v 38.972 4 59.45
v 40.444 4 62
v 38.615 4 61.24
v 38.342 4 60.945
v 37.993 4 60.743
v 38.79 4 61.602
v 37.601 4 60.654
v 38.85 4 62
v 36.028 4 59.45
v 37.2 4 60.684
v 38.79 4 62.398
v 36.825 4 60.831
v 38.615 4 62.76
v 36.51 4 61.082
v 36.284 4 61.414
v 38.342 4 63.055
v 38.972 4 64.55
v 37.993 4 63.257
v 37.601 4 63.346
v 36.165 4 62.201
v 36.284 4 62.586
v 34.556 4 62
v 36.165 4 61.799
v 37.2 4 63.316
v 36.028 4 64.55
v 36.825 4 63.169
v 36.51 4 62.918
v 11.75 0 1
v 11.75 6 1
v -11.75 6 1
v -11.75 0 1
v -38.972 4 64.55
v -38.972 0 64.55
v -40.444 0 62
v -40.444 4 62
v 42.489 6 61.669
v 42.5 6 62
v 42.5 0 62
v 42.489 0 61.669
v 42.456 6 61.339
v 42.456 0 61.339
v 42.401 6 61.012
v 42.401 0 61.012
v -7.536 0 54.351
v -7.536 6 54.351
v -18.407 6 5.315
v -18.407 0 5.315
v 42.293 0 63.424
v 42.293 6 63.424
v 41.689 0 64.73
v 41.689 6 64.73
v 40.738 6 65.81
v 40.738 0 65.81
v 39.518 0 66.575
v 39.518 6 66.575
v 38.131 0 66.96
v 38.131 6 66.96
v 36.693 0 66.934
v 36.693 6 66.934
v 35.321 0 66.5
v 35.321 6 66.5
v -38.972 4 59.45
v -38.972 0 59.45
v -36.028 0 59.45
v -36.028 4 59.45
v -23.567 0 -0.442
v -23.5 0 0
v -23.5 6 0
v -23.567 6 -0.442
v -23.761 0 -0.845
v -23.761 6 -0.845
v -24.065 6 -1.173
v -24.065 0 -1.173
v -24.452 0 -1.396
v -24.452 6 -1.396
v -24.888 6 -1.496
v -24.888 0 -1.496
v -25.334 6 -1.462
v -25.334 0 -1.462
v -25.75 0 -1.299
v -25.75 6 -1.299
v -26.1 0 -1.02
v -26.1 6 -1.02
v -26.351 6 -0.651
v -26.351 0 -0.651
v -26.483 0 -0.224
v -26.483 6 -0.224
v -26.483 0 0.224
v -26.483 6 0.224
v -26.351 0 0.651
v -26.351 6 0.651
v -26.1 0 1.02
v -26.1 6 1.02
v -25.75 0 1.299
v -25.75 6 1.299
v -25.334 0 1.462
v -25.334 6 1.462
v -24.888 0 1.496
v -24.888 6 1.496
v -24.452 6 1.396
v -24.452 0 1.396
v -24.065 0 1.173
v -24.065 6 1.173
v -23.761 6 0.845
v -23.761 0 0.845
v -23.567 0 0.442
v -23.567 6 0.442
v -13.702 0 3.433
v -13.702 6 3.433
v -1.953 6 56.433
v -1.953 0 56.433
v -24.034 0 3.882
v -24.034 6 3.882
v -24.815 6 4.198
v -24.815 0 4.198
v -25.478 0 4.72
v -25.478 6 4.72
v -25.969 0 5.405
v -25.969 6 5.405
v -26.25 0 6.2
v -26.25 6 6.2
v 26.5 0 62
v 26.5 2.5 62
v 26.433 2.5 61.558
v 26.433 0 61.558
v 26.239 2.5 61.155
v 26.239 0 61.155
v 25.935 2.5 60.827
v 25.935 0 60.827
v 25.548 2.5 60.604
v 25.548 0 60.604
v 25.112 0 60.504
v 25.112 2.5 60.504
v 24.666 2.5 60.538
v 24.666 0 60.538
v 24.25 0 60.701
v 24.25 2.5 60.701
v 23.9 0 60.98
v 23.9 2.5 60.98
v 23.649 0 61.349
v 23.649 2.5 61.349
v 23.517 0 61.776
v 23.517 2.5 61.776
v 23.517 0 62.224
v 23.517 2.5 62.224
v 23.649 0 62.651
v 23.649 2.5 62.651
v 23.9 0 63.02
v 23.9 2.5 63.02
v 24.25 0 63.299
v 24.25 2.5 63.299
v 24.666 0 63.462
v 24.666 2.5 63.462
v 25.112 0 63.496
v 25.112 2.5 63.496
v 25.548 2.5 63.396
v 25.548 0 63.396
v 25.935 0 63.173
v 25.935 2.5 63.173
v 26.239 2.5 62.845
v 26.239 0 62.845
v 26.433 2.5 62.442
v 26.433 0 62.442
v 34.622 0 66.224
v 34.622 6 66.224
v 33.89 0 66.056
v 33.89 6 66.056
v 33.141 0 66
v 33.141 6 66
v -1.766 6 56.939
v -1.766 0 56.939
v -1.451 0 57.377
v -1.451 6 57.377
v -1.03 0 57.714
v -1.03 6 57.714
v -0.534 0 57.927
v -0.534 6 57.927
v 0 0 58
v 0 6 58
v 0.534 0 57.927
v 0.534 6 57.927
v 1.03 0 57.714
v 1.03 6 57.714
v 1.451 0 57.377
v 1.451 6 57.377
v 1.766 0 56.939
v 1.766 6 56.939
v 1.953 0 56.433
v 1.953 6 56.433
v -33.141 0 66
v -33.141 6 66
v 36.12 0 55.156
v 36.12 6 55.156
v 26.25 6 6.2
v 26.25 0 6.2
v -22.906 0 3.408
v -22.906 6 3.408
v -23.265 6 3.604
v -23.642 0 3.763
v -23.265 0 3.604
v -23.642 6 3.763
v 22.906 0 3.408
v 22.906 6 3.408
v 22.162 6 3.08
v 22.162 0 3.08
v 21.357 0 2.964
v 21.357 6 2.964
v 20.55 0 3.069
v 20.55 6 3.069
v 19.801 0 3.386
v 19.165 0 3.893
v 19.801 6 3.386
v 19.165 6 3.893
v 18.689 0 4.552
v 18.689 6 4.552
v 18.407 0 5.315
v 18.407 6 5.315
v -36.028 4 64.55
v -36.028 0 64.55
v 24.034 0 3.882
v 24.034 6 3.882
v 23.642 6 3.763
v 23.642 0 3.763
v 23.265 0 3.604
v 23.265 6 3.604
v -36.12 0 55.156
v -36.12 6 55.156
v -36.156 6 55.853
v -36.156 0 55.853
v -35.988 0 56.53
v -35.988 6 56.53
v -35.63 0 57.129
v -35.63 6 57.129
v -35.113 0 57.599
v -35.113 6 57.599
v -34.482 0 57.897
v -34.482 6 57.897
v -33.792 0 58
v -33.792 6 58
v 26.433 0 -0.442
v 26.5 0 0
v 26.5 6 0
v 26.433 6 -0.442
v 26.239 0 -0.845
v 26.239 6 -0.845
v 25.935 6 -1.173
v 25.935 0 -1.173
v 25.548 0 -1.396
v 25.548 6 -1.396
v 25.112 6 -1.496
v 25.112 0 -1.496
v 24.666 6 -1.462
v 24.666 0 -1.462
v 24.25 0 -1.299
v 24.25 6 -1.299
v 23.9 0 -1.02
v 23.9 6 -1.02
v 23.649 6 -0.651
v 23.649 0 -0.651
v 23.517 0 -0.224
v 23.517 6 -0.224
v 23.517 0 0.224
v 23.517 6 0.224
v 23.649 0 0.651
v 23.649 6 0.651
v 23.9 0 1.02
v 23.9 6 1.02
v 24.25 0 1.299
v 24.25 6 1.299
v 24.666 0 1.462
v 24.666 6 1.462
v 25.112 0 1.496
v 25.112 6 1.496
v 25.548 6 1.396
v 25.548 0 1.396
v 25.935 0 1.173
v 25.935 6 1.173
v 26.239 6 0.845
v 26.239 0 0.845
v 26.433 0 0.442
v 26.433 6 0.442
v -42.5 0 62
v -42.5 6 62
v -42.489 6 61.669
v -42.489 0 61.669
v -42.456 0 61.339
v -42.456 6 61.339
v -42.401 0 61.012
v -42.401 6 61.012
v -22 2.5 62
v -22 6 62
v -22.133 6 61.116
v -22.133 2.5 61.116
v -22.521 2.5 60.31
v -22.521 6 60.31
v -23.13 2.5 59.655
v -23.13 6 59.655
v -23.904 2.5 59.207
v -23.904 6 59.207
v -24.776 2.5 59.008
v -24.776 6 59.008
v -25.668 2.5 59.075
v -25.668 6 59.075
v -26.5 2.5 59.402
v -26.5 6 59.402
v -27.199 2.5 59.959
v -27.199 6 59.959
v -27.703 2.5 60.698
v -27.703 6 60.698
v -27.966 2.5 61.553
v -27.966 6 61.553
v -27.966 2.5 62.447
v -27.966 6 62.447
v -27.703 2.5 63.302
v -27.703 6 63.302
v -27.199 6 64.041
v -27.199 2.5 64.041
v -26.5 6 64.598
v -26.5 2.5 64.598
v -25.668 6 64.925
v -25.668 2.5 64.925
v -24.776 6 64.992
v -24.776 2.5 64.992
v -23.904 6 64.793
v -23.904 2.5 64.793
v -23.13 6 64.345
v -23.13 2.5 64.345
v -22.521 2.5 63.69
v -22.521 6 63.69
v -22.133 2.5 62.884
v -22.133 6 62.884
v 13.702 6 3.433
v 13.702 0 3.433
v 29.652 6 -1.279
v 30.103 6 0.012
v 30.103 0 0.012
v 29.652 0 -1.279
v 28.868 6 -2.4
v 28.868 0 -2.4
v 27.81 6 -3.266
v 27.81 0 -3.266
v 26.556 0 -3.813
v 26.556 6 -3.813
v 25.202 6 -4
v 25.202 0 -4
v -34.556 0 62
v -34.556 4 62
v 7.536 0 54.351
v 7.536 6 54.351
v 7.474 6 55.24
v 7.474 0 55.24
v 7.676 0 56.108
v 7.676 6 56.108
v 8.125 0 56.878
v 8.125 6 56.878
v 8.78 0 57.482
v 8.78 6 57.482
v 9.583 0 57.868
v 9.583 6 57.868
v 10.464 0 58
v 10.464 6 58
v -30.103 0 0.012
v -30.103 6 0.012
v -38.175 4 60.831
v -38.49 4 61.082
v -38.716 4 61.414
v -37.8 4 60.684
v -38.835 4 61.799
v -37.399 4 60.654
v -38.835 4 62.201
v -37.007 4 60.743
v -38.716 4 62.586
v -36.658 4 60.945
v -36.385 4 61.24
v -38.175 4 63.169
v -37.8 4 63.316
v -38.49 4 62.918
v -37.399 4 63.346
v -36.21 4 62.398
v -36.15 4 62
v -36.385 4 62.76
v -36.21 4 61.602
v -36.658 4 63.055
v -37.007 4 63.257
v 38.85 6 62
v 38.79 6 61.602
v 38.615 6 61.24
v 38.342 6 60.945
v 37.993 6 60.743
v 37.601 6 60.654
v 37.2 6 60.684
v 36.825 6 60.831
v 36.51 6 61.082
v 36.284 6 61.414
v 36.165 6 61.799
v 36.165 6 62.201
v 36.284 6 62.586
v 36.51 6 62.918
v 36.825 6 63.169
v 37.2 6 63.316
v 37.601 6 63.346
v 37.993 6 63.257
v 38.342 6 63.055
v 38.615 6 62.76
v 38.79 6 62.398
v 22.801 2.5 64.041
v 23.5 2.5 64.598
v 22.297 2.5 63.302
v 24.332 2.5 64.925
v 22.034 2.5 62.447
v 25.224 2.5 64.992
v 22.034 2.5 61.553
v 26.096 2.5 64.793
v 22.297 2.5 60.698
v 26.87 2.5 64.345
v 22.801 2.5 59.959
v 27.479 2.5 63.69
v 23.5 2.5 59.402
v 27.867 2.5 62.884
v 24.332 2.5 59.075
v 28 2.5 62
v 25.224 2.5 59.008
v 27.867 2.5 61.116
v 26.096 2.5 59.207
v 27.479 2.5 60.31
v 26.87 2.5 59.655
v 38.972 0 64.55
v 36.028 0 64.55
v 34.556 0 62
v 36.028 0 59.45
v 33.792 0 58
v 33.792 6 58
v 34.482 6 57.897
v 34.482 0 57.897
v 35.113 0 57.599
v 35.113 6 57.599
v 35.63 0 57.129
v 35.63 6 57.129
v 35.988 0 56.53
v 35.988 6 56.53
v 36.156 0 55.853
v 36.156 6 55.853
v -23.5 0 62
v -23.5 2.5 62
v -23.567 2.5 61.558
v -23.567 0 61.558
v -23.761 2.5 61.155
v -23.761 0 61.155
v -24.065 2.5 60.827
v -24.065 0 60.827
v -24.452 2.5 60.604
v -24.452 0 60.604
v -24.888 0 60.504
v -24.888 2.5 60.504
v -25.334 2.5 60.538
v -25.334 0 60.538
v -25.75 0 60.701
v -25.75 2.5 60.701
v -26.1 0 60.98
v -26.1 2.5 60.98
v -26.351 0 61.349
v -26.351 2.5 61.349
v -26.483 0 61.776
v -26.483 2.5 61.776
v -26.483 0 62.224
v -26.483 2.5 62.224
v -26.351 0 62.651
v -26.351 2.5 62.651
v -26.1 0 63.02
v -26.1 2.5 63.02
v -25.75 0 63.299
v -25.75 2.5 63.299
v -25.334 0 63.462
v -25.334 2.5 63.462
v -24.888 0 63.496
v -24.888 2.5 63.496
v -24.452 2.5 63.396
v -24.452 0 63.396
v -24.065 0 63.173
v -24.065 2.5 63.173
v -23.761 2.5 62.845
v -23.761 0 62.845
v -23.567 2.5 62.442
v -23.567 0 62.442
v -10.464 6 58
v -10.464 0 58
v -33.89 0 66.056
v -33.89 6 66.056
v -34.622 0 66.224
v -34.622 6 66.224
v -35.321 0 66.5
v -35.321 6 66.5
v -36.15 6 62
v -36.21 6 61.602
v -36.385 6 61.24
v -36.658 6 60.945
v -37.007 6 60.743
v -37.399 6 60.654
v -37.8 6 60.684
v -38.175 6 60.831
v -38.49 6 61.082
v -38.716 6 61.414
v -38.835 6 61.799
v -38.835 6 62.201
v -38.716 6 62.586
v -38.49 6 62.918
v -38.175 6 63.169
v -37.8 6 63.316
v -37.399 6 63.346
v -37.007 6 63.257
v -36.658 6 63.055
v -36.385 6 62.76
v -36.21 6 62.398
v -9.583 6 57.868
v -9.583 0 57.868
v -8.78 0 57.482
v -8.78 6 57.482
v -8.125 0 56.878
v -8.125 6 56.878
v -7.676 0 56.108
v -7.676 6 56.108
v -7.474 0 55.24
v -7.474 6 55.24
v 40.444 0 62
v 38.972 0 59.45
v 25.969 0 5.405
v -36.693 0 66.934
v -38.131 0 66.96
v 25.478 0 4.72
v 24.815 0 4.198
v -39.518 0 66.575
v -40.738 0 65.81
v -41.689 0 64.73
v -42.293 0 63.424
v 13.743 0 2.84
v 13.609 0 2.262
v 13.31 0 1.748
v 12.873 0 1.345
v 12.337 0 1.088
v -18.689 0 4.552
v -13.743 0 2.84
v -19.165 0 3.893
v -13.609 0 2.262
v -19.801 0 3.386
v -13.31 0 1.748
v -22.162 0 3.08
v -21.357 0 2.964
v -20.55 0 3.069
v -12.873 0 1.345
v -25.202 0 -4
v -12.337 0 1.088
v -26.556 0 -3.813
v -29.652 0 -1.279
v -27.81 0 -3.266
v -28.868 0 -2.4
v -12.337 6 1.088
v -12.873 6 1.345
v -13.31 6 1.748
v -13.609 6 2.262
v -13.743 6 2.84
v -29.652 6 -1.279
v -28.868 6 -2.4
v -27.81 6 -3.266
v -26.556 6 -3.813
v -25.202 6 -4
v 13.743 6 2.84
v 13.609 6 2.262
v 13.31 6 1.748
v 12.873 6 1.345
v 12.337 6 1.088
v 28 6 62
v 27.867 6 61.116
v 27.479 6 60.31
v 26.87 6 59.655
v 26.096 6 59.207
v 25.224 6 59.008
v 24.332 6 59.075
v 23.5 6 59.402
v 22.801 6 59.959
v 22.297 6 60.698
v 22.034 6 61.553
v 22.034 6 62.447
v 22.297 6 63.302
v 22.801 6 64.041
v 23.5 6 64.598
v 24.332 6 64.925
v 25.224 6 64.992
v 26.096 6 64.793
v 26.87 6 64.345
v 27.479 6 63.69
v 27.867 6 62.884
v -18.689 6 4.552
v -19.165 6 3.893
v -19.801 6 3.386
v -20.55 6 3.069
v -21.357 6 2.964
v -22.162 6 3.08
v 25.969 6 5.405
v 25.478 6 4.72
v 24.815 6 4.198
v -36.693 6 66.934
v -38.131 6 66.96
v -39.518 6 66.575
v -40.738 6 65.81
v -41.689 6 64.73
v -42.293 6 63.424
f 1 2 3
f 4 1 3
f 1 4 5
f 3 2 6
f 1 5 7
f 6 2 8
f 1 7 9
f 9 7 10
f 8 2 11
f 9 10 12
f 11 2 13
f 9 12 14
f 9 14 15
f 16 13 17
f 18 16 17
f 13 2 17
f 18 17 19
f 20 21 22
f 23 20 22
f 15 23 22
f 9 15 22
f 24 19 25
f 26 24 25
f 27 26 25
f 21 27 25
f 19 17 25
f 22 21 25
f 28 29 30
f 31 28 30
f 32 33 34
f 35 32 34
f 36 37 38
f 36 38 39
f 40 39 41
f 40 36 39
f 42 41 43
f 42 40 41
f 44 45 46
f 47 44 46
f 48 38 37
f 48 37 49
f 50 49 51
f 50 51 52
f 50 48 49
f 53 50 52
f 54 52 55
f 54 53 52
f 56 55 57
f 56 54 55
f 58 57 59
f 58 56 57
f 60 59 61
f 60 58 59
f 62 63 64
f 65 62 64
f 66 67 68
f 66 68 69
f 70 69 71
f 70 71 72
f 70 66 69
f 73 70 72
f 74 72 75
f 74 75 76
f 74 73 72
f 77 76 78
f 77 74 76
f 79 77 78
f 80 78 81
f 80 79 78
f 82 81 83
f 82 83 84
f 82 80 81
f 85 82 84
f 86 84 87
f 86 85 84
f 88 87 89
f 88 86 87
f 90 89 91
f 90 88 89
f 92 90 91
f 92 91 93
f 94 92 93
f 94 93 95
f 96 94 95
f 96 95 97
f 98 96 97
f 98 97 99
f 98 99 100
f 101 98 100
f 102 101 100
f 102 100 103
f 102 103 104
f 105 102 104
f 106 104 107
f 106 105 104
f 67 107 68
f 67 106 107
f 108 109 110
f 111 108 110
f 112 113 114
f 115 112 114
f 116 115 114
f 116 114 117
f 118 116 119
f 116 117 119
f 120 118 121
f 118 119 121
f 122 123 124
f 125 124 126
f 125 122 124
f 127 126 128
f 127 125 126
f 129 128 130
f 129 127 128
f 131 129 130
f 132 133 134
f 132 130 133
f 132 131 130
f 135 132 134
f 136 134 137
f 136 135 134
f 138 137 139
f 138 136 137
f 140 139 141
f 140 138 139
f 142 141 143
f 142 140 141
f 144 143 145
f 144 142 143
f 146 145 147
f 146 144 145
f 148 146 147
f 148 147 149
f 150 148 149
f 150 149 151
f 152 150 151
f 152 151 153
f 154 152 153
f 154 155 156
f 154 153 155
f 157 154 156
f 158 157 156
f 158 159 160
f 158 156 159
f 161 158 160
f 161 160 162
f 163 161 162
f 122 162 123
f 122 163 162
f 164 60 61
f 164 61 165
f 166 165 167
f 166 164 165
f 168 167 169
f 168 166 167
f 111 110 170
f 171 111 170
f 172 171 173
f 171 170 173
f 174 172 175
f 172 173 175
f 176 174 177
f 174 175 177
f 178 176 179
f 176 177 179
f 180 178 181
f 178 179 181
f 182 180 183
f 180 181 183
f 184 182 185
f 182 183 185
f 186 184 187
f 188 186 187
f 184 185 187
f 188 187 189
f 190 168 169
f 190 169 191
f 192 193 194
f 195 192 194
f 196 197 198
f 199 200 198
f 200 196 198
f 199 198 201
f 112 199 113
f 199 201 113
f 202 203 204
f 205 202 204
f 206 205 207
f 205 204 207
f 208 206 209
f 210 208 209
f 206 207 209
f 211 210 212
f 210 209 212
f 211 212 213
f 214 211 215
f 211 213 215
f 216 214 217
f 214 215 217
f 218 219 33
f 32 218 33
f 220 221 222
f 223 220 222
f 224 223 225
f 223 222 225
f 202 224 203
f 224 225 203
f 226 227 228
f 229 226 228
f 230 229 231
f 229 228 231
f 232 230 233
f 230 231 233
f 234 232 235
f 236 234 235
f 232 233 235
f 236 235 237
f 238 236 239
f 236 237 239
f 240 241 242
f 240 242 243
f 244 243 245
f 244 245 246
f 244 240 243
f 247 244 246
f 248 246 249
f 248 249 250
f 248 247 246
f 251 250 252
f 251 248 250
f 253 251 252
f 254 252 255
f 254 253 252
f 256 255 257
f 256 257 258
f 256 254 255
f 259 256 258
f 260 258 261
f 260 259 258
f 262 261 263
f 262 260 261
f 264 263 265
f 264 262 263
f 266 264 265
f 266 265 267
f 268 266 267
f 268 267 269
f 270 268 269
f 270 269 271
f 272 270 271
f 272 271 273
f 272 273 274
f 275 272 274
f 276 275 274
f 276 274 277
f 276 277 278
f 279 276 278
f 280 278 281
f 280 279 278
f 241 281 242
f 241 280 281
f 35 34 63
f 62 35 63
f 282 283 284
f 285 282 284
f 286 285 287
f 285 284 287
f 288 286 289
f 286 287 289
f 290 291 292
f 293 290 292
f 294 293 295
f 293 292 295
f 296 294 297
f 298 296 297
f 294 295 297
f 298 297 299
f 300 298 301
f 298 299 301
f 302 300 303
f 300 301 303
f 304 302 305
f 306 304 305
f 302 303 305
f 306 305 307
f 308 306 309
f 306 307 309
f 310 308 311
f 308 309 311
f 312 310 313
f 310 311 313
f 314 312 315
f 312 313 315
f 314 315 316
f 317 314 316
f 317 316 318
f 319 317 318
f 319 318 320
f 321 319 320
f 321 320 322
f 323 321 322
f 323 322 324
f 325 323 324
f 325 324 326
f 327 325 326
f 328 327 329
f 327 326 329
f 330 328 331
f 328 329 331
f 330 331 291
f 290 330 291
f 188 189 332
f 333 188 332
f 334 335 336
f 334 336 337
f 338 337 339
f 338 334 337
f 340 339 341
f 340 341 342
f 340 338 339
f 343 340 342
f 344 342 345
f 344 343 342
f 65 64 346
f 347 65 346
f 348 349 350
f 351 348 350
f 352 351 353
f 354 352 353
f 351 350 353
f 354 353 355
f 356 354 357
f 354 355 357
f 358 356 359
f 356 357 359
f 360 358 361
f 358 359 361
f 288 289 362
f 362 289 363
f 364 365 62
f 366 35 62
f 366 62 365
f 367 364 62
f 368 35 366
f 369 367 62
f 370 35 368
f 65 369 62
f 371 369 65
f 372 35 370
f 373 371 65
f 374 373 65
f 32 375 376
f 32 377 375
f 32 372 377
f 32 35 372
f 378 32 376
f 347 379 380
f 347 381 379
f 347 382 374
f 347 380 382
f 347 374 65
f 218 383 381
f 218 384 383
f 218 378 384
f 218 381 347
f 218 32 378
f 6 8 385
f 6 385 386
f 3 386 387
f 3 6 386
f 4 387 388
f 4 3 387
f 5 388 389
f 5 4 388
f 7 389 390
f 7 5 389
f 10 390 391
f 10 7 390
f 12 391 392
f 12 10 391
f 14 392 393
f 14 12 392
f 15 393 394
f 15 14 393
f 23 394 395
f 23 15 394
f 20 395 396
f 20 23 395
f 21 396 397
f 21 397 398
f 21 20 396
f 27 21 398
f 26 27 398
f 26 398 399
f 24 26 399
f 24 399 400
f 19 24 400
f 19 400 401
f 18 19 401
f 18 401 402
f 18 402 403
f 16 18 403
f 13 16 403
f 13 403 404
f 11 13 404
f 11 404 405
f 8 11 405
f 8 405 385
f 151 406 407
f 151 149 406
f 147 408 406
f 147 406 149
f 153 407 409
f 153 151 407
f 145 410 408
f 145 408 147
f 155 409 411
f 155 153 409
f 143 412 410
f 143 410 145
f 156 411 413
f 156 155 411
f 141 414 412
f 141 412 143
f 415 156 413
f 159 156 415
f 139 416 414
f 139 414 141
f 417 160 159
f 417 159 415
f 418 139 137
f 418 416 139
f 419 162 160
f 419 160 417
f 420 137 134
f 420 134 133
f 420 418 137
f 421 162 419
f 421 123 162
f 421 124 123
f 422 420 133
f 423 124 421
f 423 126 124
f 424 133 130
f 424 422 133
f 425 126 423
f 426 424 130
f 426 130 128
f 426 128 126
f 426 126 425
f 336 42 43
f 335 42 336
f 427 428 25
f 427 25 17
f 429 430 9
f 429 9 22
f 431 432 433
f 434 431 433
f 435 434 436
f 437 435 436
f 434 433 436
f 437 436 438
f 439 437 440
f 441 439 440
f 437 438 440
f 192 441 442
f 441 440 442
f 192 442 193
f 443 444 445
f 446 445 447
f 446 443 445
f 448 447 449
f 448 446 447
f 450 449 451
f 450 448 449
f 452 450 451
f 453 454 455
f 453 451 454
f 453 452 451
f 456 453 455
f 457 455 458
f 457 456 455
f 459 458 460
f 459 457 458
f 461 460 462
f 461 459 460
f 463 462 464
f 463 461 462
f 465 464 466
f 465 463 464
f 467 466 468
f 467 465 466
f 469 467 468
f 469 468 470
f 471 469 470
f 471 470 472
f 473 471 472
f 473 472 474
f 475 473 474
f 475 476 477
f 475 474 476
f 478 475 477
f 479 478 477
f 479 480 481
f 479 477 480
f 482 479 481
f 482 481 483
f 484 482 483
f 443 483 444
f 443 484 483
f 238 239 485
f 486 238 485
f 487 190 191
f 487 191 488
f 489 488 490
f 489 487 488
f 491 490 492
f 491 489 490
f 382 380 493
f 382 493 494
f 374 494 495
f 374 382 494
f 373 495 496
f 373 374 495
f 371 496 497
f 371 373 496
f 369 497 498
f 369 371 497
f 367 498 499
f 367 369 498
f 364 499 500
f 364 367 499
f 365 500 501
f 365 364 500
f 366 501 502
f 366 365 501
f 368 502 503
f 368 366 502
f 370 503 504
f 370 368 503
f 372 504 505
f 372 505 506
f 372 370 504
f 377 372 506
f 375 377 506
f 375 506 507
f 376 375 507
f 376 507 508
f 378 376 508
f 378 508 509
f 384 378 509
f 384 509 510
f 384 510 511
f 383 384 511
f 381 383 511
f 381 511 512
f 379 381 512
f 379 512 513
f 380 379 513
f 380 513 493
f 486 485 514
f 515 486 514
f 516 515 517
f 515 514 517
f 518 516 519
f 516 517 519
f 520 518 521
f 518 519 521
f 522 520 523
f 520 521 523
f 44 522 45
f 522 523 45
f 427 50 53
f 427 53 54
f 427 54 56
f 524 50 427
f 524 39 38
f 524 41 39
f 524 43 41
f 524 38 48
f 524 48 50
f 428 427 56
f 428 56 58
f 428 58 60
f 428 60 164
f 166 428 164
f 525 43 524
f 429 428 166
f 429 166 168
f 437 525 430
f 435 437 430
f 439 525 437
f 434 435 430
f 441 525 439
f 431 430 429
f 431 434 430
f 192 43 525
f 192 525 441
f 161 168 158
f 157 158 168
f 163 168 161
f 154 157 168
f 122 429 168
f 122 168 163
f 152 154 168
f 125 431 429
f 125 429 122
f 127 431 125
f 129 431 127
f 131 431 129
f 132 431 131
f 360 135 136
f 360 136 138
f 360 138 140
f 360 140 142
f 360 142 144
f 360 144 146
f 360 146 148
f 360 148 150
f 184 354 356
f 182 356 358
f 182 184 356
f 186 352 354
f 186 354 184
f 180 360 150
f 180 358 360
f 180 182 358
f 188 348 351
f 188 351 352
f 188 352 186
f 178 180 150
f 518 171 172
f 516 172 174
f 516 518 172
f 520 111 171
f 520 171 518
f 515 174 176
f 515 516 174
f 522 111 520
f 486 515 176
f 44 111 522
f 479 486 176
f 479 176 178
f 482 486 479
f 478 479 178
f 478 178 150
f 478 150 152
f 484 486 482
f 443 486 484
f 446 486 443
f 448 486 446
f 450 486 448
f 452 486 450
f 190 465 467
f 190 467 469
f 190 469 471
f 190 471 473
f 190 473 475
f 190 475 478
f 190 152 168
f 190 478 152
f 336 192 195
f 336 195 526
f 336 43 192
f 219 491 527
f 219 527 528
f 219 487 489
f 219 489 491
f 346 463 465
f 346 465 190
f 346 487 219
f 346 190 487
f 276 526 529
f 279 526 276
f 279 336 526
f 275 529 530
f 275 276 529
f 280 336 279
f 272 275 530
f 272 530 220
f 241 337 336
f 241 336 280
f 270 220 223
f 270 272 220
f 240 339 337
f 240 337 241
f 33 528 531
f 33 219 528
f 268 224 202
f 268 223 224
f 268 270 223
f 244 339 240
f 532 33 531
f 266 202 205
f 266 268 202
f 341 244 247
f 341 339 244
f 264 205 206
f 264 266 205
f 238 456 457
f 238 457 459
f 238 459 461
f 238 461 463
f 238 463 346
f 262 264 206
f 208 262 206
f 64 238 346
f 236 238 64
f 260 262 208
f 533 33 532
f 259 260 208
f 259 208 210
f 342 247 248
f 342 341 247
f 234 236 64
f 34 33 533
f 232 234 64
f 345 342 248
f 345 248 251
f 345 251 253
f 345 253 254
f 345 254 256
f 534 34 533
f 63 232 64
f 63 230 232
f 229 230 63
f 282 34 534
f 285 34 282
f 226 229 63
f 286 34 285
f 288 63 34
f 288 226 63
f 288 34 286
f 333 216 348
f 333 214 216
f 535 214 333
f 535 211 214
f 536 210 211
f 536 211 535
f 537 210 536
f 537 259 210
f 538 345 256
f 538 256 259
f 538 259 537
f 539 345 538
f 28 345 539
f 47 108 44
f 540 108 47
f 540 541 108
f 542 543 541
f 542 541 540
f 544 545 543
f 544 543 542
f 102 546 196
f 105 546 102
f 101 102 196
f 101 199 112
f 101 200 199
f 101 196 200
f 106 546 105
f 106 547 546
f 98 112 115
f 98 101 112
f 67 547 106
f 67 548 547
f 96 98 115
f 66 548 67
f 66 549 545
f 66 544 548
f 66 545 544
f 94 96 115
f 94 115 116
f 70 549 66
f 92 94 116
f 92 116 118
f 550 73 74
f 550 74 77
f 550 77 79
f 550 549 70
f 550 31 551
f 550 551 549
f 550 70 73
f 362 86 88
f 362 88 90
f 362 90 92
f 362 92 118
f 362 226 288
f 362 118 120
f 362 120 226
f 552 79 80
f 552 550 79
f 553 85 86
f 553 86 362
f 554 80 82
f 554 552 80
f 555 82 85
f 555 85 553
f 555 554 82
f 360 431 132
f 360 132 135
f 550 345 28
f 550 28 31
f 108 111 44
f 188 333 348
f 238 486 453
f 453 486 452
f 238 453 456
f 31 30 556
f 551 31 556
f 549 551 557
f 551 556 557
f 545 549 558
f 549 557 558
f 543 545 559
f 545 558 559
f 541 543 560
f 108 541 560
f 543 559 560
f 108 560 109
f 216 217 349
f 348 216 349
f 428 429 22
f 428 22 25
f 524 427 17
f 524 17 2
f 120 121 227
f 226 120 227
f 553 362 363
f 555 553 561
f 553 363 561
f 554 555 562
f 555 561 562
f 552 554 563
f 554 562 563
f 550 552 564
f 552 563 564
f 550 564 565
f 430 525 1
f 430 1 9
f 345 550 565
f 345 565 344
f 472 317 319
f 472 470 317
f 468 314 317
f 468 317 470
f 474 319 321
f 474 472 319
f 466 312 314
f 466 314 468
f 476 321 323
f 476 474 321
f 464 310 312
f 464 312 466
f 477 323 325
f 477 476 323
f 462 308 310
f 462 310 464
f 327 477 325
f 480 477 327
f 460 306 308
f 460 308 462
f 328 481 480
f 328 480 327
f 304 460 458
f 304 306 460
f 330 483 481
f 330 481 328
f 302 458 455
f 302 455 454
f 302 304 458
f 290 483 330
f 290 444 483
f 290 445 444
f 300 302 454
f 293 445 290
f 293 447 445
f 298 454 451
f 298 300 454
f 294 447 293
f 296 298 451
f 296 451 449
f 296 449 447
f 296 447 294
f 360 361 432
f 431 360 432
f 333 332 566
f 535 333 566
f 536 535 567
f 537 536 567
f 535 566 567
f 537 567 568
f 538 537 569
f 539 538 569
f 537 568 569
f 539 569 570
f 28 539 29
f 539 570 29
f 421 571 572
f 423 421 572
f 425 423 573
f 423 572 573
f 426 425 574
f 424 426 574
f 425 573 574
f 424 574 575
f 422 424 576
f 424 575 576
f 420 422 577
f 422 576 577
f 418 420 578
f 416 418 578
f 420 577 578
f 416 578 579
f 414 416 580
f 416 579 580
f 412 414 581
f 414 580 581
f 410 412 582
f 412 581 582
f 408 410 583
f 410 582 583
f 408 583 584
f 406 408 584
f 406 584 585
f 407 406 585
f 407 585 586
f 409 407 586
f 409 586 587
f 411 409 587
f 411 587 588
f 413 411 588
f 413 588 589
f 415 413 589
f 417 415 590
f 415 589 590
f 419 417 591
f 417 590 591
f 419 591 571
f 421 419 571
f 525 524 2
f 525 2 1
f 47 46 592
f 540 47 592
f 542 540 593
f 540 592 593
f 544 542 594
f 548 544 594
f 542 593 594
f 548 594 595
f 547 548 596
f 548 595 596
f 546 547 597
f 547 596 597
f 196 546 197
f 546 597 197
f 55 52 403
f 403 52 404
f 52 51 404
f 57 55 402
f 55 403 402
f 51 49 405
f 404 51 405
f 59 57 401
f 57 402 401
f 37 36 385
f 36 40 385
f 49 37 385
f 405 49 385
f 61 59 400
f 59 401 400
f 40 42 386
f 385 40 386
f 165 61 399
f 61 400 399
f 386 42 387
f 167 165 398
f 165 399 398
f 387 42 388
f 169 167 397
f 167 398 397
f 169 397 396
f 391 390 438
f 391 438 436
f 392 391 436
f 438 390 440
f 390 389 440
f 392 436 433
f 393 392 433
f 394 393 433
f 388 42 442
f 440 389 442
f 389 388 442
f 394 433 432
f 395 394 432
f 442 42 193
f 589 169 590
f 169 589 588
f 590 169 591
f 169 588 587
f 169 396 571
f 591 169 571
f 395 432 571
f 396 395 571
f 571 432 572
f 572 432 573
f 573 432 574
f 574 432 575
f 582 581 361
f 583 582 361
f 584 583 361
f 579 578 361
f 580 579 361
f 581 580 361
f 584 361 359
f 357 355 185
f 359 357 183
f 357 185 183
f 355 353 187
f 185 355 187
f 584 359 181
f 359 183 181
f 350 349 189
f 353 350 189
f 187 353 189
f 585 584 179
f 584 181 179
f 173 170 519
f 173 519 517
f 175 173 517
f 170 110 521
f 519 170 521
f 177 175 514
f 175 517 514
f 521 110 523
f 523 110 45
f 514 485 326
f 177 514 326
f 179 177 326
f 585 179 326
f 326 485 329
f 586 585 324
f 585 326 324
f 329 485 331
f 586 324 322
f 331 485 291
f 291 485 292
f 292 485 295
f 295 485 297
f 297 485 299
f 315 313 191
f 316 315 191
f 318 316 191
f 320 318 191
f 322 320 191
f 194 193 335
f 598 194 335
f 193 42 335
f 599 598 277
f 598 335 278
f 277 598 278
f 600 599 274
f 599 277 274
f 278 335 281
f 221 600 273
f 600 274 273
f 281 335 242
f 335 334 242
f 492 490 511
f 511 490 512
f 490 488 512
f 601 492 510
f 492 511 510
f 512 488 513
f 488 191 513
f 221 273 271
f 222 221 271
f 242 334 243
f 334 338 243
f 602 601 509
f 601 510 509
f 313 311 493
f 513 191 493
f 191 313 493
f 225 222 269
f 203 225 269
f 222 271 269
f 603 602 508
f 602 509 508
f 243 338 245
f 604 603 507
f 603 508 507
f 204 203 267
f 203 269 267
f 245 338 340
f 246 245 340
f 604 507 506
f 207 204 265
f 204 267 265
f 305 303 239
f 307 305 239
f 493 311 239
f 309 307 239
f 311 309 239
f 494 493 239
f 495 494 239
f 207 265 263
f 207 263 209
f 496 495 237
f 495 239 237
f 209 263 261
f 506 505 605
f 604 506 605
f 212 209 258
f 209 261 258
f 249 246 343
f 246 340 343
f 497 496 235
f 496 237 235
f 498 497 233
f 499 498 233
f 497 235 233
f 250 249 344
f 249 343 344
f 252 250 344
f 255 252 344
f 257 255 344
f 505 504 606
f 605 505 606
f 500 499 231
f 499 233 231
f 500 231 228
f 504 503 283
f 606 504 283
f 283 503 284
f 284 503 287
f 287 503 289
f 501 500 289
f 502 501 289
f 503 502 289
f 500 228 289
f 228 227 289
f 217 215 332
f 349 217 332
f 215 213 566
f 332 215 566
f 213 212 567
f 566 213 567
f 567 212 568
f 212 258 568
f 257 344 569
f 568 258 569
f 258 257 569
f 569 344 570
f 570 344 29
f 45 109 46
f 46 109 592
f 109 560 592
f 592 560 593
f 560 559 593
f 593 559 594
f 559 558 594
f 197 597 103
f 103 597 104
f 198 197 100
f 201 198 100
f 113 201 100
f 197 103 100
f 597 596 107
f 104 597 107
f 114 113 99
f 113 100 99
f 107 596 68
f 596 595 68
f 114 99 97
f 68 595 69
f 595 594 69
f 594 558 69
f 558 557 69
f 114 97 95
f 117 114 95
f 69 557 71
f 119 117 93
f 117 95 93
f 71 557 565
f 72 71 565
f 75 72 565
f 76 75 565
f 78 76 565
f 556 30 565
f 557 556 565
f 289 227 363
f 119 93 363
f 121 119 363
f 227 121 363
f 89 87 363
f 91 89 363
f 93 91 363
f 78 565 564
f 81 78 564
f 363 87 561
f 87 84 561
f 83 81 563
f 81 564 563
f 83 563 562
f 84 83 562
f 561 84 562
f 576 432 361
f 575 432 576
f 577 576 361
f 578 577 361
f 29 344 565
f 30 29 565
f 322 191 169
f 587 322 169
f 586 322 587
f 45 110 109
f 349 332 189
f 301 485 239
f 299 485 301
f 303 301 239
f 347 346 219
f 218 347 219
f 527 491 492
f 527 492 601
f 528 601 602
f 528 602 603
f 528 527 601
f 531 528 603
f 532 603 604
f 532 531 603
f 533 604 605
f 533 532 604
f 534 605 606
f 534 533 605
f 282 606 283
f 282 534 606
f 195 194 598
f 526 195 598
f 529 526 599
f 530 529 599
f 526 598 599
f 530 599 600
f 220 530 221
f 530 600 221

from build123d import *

# Parameters (mm, degrees)
SKETCH_2_R          = 1.5
SKETCH_2_R_2        = 1.35
EXTRUDE_1_DEPTH     = 6
SKETCH_5_R          = 3
CUT_EXTRUDE_4_DEPTH = 3.5
CUT_EXTRUDE_5_DEPTH = 4
CUT_EXTRUDE_6_DEPTH = 7


with BuildPart() as part:
    # 草图2 → 凸台-拉伸1 (new body)
    with BuildSketch(Plane(origin=(0, 0, 0), x_dir=(1, 0, 0), z_dir=(0, 1, 0))):
        with BuildLine():
            Line((-42.5, -62), (-42.5, 1))
            ThreePointArc((-42.5, 1), (-41.621320344, 3.121320344), (-39.5, 4))
            Line((-39.5, 4), (39.5, 4))
            ThreePointArc((39.5, 4), (41.621320344, 3.121320344), (42.5, 1))
            Line((42.5, 1), (42.5, -62))
            ThreePointArc((42.5, -62), (40.155442773, -66.236581603), (35.320550528, -66.5))
            ThreePointArc((35.320550528, -66.5), (34.259135045, -66.126602828), (33.141101056, -66))
            Line((33.141101056, -66), (-33.141101056, -66))
            ThreePointArc((-33.141101056, -66), (-34.259135045, -66.126602828), (-35.320550528, -66.5))
            ThreePointArc((-35.320550528, -66.5), (-40.155442773, -66.236581603), (-42.5, -62))
        make_face()
        with Locations((-25, 0)):
            Circle(SKETCH_2_R, mode=Mode.SUBTRACT)
        with Locations((25, 0)):
            Circle(SKETCH_2_R, mode=Mode.SUBTRACT)
        with Locations((-25, -62)):
            Circle(SKETCH_2_R, mode=Mode.SUBTRACT)
        with Locations((25, -62)):
            Circle(SKETCH_2_R, mode=Mode.SUBTRACT)
        with Locations((-37.5, -62)):
            Circle(SKETCH_2_R_2, mode=Mode.SUBTRACT)
        with Locations((37.5, -62)):
            Circle(SKETCH_2_R_2, mode=Mode.SUBTRACT)
    extrude(amount=EXTRUDE_1_DEPTH)

    # 草图5 → 切除-拉伸4 (cut)
    with BuildSketch(Plane(origin=(0, 6, 0), x_dir=(1, 0, 0), z_dir=(0, 1, 0))):
        with Locations((-25, -62)):
            Circle(SKETCH_5_R)
        with Locations((25, -62)):
            Circle(SKETCH_5_R)
    extrude(amount=-CUT_EXTRUDE_4_DEPTH, mode=Mode.SUBTRACT)

    # 草图6 → 切除-拉伸5 (cut)
    with BuildSketch(Plane.XZ):
        Polygon((-36.027756814, 64.55), (-38.972243186, 64.55), (-40.444486373, 62), (-38.972243186, 59.45), (-36.027756814, 59.45), (-34.555513627, 62), align=None)
        Polygon((34.555513627, 62), (36.027756814, 64.55), (38.972243186, 64.55), (40.444486373, 62), (38.972243186, 59.45), (36.027756814, 59.45), align=None)
    extrude(amount=-CUT_EXTRUDE_5_DEPTH, mode=Mode.SUBTRACT)

    # 草图7 → 切除-拉伸6 (cut, through all)
    with BuildSketch(Plane(origin=(0, 6, 0), x_dir=(1, 0, 0), z_dir=(0, 1, 0))):
        with BuildLine():
            Line((-33.791892668, -58), (-10.464489806, -58))
            ThreePointArc((-10.464489806, -58), (-8.124836357, -56.877770417), (-7.535601784, -54.350681158))
            Line((-7.535601784, -54.350681158), (-18.406585082, -5.314844354))
            ThreePointArc((-18.406585082, -5.314844354), (-20.164908448, -3.201957847), (-22.905984631, -3.408093255))
            ThreePointArc((-22.905984631, -3.408093255), (-23.45168362, -3.688186057), (-24.033791208, -3.88155131))
            ThreePointArc((-24.033791208, -3.88155131), (-25.477663554, -4.719677831), (-26.249960939, -6.199806259))
            Line((-26.249960939, -6.199806259), (-36.120076242, -55.155578159))
            ThreePointArc((-36.120076242, -55.155578159), (-35.629770137, -57.129288416), (-33.791892668, -58))
        make_face()
        with BuildLine():
            Line((-13.702409134, -3.432879228), (-1.952592014, -56.432879228))
            ThreePointArc((-1.952592014, -56.432879228), (0, -58), (1.952592014, -56.432879228))
            Line((1.952592014, -56.432879228), (13.702409134, -3.432879228))
            ThreePointArc((13.702409134, -3.432879228), (13.309586086, -1.748153056), (11.74981712, -1))
            Line((11.74981712, -1), (-11.74981712, -1))
            ThreePointArc((-11.74981712, -1), (-13.309586086, -1.748153056), (-13.702409134, -3.432879228))
        make_face()
        with BuildLine():
            Line((18.406585082, -5.314844354), (7.535601784, -54.350681158))
            ThreePointArc((7.535601784, -54.350681158), (8.124836357, -56.877770417), (10.464489806, -58))
            Line((10.464489806, -58), (33.791892668, -58))
            ThreePointArc((33.791892668, -58), (35.629770137, -57.129288416), (36.120076242, -55.155578159))
            Line((36.120076242, -55.155578159), (26.249960939, -6.199806259))
            ThreePointArc((26.249960939, -6.199806259), (25.477663554, -4.719677831), (24.033791208, -3.88155131))
            ThreePointArc((24.033791208, -3.88155131), (23.45168362, -3.688186057), (22.905984631, -3.408093255))
            ThreePointArc((22.905984631, -3.408093255), (20.164908448, -3.201957847), (18.406585082, -5.314844354))
        make_face()
        with BuildLine():
            Line((-42.401377208, -61.011819111), (-30.102990111, -0.011819111))
            ThreePointArc((-30.102990111, -0.011819111), (-28.368559031, 2.869166864), (-25.201612903, 4))
            Line((-25.201612903, 4), (-42.5, 4))
            Line((-42.5, 4), (-42.5, -62))
            ThreePointArc((-42.5, -62), (-42.47528321, -61.503454956), (-42.401377208, -61.011819111))
        make_face()
        with BuildLine():
            Line((42.401377208, -61.011819111), (30.102990111, -0.011819111))
            ThreePointArc((30.102990111, -0.011819111), (28.368559031, 2.869166864), (25.201612903, 4))
            Line((25.201612903, 4), (42.5, 4))
            Line((42.5, 4), (42.5, -62))
            ThreePointArc((42.5, -62), (42.47528321, -61.503454956), (42.401377208, -61.011819111))
        make_face()
    extrude(amount=-CUT_EXTRUDE_6_DEPTH, mode=Mode.SUBTRACT)


solid = part.part
